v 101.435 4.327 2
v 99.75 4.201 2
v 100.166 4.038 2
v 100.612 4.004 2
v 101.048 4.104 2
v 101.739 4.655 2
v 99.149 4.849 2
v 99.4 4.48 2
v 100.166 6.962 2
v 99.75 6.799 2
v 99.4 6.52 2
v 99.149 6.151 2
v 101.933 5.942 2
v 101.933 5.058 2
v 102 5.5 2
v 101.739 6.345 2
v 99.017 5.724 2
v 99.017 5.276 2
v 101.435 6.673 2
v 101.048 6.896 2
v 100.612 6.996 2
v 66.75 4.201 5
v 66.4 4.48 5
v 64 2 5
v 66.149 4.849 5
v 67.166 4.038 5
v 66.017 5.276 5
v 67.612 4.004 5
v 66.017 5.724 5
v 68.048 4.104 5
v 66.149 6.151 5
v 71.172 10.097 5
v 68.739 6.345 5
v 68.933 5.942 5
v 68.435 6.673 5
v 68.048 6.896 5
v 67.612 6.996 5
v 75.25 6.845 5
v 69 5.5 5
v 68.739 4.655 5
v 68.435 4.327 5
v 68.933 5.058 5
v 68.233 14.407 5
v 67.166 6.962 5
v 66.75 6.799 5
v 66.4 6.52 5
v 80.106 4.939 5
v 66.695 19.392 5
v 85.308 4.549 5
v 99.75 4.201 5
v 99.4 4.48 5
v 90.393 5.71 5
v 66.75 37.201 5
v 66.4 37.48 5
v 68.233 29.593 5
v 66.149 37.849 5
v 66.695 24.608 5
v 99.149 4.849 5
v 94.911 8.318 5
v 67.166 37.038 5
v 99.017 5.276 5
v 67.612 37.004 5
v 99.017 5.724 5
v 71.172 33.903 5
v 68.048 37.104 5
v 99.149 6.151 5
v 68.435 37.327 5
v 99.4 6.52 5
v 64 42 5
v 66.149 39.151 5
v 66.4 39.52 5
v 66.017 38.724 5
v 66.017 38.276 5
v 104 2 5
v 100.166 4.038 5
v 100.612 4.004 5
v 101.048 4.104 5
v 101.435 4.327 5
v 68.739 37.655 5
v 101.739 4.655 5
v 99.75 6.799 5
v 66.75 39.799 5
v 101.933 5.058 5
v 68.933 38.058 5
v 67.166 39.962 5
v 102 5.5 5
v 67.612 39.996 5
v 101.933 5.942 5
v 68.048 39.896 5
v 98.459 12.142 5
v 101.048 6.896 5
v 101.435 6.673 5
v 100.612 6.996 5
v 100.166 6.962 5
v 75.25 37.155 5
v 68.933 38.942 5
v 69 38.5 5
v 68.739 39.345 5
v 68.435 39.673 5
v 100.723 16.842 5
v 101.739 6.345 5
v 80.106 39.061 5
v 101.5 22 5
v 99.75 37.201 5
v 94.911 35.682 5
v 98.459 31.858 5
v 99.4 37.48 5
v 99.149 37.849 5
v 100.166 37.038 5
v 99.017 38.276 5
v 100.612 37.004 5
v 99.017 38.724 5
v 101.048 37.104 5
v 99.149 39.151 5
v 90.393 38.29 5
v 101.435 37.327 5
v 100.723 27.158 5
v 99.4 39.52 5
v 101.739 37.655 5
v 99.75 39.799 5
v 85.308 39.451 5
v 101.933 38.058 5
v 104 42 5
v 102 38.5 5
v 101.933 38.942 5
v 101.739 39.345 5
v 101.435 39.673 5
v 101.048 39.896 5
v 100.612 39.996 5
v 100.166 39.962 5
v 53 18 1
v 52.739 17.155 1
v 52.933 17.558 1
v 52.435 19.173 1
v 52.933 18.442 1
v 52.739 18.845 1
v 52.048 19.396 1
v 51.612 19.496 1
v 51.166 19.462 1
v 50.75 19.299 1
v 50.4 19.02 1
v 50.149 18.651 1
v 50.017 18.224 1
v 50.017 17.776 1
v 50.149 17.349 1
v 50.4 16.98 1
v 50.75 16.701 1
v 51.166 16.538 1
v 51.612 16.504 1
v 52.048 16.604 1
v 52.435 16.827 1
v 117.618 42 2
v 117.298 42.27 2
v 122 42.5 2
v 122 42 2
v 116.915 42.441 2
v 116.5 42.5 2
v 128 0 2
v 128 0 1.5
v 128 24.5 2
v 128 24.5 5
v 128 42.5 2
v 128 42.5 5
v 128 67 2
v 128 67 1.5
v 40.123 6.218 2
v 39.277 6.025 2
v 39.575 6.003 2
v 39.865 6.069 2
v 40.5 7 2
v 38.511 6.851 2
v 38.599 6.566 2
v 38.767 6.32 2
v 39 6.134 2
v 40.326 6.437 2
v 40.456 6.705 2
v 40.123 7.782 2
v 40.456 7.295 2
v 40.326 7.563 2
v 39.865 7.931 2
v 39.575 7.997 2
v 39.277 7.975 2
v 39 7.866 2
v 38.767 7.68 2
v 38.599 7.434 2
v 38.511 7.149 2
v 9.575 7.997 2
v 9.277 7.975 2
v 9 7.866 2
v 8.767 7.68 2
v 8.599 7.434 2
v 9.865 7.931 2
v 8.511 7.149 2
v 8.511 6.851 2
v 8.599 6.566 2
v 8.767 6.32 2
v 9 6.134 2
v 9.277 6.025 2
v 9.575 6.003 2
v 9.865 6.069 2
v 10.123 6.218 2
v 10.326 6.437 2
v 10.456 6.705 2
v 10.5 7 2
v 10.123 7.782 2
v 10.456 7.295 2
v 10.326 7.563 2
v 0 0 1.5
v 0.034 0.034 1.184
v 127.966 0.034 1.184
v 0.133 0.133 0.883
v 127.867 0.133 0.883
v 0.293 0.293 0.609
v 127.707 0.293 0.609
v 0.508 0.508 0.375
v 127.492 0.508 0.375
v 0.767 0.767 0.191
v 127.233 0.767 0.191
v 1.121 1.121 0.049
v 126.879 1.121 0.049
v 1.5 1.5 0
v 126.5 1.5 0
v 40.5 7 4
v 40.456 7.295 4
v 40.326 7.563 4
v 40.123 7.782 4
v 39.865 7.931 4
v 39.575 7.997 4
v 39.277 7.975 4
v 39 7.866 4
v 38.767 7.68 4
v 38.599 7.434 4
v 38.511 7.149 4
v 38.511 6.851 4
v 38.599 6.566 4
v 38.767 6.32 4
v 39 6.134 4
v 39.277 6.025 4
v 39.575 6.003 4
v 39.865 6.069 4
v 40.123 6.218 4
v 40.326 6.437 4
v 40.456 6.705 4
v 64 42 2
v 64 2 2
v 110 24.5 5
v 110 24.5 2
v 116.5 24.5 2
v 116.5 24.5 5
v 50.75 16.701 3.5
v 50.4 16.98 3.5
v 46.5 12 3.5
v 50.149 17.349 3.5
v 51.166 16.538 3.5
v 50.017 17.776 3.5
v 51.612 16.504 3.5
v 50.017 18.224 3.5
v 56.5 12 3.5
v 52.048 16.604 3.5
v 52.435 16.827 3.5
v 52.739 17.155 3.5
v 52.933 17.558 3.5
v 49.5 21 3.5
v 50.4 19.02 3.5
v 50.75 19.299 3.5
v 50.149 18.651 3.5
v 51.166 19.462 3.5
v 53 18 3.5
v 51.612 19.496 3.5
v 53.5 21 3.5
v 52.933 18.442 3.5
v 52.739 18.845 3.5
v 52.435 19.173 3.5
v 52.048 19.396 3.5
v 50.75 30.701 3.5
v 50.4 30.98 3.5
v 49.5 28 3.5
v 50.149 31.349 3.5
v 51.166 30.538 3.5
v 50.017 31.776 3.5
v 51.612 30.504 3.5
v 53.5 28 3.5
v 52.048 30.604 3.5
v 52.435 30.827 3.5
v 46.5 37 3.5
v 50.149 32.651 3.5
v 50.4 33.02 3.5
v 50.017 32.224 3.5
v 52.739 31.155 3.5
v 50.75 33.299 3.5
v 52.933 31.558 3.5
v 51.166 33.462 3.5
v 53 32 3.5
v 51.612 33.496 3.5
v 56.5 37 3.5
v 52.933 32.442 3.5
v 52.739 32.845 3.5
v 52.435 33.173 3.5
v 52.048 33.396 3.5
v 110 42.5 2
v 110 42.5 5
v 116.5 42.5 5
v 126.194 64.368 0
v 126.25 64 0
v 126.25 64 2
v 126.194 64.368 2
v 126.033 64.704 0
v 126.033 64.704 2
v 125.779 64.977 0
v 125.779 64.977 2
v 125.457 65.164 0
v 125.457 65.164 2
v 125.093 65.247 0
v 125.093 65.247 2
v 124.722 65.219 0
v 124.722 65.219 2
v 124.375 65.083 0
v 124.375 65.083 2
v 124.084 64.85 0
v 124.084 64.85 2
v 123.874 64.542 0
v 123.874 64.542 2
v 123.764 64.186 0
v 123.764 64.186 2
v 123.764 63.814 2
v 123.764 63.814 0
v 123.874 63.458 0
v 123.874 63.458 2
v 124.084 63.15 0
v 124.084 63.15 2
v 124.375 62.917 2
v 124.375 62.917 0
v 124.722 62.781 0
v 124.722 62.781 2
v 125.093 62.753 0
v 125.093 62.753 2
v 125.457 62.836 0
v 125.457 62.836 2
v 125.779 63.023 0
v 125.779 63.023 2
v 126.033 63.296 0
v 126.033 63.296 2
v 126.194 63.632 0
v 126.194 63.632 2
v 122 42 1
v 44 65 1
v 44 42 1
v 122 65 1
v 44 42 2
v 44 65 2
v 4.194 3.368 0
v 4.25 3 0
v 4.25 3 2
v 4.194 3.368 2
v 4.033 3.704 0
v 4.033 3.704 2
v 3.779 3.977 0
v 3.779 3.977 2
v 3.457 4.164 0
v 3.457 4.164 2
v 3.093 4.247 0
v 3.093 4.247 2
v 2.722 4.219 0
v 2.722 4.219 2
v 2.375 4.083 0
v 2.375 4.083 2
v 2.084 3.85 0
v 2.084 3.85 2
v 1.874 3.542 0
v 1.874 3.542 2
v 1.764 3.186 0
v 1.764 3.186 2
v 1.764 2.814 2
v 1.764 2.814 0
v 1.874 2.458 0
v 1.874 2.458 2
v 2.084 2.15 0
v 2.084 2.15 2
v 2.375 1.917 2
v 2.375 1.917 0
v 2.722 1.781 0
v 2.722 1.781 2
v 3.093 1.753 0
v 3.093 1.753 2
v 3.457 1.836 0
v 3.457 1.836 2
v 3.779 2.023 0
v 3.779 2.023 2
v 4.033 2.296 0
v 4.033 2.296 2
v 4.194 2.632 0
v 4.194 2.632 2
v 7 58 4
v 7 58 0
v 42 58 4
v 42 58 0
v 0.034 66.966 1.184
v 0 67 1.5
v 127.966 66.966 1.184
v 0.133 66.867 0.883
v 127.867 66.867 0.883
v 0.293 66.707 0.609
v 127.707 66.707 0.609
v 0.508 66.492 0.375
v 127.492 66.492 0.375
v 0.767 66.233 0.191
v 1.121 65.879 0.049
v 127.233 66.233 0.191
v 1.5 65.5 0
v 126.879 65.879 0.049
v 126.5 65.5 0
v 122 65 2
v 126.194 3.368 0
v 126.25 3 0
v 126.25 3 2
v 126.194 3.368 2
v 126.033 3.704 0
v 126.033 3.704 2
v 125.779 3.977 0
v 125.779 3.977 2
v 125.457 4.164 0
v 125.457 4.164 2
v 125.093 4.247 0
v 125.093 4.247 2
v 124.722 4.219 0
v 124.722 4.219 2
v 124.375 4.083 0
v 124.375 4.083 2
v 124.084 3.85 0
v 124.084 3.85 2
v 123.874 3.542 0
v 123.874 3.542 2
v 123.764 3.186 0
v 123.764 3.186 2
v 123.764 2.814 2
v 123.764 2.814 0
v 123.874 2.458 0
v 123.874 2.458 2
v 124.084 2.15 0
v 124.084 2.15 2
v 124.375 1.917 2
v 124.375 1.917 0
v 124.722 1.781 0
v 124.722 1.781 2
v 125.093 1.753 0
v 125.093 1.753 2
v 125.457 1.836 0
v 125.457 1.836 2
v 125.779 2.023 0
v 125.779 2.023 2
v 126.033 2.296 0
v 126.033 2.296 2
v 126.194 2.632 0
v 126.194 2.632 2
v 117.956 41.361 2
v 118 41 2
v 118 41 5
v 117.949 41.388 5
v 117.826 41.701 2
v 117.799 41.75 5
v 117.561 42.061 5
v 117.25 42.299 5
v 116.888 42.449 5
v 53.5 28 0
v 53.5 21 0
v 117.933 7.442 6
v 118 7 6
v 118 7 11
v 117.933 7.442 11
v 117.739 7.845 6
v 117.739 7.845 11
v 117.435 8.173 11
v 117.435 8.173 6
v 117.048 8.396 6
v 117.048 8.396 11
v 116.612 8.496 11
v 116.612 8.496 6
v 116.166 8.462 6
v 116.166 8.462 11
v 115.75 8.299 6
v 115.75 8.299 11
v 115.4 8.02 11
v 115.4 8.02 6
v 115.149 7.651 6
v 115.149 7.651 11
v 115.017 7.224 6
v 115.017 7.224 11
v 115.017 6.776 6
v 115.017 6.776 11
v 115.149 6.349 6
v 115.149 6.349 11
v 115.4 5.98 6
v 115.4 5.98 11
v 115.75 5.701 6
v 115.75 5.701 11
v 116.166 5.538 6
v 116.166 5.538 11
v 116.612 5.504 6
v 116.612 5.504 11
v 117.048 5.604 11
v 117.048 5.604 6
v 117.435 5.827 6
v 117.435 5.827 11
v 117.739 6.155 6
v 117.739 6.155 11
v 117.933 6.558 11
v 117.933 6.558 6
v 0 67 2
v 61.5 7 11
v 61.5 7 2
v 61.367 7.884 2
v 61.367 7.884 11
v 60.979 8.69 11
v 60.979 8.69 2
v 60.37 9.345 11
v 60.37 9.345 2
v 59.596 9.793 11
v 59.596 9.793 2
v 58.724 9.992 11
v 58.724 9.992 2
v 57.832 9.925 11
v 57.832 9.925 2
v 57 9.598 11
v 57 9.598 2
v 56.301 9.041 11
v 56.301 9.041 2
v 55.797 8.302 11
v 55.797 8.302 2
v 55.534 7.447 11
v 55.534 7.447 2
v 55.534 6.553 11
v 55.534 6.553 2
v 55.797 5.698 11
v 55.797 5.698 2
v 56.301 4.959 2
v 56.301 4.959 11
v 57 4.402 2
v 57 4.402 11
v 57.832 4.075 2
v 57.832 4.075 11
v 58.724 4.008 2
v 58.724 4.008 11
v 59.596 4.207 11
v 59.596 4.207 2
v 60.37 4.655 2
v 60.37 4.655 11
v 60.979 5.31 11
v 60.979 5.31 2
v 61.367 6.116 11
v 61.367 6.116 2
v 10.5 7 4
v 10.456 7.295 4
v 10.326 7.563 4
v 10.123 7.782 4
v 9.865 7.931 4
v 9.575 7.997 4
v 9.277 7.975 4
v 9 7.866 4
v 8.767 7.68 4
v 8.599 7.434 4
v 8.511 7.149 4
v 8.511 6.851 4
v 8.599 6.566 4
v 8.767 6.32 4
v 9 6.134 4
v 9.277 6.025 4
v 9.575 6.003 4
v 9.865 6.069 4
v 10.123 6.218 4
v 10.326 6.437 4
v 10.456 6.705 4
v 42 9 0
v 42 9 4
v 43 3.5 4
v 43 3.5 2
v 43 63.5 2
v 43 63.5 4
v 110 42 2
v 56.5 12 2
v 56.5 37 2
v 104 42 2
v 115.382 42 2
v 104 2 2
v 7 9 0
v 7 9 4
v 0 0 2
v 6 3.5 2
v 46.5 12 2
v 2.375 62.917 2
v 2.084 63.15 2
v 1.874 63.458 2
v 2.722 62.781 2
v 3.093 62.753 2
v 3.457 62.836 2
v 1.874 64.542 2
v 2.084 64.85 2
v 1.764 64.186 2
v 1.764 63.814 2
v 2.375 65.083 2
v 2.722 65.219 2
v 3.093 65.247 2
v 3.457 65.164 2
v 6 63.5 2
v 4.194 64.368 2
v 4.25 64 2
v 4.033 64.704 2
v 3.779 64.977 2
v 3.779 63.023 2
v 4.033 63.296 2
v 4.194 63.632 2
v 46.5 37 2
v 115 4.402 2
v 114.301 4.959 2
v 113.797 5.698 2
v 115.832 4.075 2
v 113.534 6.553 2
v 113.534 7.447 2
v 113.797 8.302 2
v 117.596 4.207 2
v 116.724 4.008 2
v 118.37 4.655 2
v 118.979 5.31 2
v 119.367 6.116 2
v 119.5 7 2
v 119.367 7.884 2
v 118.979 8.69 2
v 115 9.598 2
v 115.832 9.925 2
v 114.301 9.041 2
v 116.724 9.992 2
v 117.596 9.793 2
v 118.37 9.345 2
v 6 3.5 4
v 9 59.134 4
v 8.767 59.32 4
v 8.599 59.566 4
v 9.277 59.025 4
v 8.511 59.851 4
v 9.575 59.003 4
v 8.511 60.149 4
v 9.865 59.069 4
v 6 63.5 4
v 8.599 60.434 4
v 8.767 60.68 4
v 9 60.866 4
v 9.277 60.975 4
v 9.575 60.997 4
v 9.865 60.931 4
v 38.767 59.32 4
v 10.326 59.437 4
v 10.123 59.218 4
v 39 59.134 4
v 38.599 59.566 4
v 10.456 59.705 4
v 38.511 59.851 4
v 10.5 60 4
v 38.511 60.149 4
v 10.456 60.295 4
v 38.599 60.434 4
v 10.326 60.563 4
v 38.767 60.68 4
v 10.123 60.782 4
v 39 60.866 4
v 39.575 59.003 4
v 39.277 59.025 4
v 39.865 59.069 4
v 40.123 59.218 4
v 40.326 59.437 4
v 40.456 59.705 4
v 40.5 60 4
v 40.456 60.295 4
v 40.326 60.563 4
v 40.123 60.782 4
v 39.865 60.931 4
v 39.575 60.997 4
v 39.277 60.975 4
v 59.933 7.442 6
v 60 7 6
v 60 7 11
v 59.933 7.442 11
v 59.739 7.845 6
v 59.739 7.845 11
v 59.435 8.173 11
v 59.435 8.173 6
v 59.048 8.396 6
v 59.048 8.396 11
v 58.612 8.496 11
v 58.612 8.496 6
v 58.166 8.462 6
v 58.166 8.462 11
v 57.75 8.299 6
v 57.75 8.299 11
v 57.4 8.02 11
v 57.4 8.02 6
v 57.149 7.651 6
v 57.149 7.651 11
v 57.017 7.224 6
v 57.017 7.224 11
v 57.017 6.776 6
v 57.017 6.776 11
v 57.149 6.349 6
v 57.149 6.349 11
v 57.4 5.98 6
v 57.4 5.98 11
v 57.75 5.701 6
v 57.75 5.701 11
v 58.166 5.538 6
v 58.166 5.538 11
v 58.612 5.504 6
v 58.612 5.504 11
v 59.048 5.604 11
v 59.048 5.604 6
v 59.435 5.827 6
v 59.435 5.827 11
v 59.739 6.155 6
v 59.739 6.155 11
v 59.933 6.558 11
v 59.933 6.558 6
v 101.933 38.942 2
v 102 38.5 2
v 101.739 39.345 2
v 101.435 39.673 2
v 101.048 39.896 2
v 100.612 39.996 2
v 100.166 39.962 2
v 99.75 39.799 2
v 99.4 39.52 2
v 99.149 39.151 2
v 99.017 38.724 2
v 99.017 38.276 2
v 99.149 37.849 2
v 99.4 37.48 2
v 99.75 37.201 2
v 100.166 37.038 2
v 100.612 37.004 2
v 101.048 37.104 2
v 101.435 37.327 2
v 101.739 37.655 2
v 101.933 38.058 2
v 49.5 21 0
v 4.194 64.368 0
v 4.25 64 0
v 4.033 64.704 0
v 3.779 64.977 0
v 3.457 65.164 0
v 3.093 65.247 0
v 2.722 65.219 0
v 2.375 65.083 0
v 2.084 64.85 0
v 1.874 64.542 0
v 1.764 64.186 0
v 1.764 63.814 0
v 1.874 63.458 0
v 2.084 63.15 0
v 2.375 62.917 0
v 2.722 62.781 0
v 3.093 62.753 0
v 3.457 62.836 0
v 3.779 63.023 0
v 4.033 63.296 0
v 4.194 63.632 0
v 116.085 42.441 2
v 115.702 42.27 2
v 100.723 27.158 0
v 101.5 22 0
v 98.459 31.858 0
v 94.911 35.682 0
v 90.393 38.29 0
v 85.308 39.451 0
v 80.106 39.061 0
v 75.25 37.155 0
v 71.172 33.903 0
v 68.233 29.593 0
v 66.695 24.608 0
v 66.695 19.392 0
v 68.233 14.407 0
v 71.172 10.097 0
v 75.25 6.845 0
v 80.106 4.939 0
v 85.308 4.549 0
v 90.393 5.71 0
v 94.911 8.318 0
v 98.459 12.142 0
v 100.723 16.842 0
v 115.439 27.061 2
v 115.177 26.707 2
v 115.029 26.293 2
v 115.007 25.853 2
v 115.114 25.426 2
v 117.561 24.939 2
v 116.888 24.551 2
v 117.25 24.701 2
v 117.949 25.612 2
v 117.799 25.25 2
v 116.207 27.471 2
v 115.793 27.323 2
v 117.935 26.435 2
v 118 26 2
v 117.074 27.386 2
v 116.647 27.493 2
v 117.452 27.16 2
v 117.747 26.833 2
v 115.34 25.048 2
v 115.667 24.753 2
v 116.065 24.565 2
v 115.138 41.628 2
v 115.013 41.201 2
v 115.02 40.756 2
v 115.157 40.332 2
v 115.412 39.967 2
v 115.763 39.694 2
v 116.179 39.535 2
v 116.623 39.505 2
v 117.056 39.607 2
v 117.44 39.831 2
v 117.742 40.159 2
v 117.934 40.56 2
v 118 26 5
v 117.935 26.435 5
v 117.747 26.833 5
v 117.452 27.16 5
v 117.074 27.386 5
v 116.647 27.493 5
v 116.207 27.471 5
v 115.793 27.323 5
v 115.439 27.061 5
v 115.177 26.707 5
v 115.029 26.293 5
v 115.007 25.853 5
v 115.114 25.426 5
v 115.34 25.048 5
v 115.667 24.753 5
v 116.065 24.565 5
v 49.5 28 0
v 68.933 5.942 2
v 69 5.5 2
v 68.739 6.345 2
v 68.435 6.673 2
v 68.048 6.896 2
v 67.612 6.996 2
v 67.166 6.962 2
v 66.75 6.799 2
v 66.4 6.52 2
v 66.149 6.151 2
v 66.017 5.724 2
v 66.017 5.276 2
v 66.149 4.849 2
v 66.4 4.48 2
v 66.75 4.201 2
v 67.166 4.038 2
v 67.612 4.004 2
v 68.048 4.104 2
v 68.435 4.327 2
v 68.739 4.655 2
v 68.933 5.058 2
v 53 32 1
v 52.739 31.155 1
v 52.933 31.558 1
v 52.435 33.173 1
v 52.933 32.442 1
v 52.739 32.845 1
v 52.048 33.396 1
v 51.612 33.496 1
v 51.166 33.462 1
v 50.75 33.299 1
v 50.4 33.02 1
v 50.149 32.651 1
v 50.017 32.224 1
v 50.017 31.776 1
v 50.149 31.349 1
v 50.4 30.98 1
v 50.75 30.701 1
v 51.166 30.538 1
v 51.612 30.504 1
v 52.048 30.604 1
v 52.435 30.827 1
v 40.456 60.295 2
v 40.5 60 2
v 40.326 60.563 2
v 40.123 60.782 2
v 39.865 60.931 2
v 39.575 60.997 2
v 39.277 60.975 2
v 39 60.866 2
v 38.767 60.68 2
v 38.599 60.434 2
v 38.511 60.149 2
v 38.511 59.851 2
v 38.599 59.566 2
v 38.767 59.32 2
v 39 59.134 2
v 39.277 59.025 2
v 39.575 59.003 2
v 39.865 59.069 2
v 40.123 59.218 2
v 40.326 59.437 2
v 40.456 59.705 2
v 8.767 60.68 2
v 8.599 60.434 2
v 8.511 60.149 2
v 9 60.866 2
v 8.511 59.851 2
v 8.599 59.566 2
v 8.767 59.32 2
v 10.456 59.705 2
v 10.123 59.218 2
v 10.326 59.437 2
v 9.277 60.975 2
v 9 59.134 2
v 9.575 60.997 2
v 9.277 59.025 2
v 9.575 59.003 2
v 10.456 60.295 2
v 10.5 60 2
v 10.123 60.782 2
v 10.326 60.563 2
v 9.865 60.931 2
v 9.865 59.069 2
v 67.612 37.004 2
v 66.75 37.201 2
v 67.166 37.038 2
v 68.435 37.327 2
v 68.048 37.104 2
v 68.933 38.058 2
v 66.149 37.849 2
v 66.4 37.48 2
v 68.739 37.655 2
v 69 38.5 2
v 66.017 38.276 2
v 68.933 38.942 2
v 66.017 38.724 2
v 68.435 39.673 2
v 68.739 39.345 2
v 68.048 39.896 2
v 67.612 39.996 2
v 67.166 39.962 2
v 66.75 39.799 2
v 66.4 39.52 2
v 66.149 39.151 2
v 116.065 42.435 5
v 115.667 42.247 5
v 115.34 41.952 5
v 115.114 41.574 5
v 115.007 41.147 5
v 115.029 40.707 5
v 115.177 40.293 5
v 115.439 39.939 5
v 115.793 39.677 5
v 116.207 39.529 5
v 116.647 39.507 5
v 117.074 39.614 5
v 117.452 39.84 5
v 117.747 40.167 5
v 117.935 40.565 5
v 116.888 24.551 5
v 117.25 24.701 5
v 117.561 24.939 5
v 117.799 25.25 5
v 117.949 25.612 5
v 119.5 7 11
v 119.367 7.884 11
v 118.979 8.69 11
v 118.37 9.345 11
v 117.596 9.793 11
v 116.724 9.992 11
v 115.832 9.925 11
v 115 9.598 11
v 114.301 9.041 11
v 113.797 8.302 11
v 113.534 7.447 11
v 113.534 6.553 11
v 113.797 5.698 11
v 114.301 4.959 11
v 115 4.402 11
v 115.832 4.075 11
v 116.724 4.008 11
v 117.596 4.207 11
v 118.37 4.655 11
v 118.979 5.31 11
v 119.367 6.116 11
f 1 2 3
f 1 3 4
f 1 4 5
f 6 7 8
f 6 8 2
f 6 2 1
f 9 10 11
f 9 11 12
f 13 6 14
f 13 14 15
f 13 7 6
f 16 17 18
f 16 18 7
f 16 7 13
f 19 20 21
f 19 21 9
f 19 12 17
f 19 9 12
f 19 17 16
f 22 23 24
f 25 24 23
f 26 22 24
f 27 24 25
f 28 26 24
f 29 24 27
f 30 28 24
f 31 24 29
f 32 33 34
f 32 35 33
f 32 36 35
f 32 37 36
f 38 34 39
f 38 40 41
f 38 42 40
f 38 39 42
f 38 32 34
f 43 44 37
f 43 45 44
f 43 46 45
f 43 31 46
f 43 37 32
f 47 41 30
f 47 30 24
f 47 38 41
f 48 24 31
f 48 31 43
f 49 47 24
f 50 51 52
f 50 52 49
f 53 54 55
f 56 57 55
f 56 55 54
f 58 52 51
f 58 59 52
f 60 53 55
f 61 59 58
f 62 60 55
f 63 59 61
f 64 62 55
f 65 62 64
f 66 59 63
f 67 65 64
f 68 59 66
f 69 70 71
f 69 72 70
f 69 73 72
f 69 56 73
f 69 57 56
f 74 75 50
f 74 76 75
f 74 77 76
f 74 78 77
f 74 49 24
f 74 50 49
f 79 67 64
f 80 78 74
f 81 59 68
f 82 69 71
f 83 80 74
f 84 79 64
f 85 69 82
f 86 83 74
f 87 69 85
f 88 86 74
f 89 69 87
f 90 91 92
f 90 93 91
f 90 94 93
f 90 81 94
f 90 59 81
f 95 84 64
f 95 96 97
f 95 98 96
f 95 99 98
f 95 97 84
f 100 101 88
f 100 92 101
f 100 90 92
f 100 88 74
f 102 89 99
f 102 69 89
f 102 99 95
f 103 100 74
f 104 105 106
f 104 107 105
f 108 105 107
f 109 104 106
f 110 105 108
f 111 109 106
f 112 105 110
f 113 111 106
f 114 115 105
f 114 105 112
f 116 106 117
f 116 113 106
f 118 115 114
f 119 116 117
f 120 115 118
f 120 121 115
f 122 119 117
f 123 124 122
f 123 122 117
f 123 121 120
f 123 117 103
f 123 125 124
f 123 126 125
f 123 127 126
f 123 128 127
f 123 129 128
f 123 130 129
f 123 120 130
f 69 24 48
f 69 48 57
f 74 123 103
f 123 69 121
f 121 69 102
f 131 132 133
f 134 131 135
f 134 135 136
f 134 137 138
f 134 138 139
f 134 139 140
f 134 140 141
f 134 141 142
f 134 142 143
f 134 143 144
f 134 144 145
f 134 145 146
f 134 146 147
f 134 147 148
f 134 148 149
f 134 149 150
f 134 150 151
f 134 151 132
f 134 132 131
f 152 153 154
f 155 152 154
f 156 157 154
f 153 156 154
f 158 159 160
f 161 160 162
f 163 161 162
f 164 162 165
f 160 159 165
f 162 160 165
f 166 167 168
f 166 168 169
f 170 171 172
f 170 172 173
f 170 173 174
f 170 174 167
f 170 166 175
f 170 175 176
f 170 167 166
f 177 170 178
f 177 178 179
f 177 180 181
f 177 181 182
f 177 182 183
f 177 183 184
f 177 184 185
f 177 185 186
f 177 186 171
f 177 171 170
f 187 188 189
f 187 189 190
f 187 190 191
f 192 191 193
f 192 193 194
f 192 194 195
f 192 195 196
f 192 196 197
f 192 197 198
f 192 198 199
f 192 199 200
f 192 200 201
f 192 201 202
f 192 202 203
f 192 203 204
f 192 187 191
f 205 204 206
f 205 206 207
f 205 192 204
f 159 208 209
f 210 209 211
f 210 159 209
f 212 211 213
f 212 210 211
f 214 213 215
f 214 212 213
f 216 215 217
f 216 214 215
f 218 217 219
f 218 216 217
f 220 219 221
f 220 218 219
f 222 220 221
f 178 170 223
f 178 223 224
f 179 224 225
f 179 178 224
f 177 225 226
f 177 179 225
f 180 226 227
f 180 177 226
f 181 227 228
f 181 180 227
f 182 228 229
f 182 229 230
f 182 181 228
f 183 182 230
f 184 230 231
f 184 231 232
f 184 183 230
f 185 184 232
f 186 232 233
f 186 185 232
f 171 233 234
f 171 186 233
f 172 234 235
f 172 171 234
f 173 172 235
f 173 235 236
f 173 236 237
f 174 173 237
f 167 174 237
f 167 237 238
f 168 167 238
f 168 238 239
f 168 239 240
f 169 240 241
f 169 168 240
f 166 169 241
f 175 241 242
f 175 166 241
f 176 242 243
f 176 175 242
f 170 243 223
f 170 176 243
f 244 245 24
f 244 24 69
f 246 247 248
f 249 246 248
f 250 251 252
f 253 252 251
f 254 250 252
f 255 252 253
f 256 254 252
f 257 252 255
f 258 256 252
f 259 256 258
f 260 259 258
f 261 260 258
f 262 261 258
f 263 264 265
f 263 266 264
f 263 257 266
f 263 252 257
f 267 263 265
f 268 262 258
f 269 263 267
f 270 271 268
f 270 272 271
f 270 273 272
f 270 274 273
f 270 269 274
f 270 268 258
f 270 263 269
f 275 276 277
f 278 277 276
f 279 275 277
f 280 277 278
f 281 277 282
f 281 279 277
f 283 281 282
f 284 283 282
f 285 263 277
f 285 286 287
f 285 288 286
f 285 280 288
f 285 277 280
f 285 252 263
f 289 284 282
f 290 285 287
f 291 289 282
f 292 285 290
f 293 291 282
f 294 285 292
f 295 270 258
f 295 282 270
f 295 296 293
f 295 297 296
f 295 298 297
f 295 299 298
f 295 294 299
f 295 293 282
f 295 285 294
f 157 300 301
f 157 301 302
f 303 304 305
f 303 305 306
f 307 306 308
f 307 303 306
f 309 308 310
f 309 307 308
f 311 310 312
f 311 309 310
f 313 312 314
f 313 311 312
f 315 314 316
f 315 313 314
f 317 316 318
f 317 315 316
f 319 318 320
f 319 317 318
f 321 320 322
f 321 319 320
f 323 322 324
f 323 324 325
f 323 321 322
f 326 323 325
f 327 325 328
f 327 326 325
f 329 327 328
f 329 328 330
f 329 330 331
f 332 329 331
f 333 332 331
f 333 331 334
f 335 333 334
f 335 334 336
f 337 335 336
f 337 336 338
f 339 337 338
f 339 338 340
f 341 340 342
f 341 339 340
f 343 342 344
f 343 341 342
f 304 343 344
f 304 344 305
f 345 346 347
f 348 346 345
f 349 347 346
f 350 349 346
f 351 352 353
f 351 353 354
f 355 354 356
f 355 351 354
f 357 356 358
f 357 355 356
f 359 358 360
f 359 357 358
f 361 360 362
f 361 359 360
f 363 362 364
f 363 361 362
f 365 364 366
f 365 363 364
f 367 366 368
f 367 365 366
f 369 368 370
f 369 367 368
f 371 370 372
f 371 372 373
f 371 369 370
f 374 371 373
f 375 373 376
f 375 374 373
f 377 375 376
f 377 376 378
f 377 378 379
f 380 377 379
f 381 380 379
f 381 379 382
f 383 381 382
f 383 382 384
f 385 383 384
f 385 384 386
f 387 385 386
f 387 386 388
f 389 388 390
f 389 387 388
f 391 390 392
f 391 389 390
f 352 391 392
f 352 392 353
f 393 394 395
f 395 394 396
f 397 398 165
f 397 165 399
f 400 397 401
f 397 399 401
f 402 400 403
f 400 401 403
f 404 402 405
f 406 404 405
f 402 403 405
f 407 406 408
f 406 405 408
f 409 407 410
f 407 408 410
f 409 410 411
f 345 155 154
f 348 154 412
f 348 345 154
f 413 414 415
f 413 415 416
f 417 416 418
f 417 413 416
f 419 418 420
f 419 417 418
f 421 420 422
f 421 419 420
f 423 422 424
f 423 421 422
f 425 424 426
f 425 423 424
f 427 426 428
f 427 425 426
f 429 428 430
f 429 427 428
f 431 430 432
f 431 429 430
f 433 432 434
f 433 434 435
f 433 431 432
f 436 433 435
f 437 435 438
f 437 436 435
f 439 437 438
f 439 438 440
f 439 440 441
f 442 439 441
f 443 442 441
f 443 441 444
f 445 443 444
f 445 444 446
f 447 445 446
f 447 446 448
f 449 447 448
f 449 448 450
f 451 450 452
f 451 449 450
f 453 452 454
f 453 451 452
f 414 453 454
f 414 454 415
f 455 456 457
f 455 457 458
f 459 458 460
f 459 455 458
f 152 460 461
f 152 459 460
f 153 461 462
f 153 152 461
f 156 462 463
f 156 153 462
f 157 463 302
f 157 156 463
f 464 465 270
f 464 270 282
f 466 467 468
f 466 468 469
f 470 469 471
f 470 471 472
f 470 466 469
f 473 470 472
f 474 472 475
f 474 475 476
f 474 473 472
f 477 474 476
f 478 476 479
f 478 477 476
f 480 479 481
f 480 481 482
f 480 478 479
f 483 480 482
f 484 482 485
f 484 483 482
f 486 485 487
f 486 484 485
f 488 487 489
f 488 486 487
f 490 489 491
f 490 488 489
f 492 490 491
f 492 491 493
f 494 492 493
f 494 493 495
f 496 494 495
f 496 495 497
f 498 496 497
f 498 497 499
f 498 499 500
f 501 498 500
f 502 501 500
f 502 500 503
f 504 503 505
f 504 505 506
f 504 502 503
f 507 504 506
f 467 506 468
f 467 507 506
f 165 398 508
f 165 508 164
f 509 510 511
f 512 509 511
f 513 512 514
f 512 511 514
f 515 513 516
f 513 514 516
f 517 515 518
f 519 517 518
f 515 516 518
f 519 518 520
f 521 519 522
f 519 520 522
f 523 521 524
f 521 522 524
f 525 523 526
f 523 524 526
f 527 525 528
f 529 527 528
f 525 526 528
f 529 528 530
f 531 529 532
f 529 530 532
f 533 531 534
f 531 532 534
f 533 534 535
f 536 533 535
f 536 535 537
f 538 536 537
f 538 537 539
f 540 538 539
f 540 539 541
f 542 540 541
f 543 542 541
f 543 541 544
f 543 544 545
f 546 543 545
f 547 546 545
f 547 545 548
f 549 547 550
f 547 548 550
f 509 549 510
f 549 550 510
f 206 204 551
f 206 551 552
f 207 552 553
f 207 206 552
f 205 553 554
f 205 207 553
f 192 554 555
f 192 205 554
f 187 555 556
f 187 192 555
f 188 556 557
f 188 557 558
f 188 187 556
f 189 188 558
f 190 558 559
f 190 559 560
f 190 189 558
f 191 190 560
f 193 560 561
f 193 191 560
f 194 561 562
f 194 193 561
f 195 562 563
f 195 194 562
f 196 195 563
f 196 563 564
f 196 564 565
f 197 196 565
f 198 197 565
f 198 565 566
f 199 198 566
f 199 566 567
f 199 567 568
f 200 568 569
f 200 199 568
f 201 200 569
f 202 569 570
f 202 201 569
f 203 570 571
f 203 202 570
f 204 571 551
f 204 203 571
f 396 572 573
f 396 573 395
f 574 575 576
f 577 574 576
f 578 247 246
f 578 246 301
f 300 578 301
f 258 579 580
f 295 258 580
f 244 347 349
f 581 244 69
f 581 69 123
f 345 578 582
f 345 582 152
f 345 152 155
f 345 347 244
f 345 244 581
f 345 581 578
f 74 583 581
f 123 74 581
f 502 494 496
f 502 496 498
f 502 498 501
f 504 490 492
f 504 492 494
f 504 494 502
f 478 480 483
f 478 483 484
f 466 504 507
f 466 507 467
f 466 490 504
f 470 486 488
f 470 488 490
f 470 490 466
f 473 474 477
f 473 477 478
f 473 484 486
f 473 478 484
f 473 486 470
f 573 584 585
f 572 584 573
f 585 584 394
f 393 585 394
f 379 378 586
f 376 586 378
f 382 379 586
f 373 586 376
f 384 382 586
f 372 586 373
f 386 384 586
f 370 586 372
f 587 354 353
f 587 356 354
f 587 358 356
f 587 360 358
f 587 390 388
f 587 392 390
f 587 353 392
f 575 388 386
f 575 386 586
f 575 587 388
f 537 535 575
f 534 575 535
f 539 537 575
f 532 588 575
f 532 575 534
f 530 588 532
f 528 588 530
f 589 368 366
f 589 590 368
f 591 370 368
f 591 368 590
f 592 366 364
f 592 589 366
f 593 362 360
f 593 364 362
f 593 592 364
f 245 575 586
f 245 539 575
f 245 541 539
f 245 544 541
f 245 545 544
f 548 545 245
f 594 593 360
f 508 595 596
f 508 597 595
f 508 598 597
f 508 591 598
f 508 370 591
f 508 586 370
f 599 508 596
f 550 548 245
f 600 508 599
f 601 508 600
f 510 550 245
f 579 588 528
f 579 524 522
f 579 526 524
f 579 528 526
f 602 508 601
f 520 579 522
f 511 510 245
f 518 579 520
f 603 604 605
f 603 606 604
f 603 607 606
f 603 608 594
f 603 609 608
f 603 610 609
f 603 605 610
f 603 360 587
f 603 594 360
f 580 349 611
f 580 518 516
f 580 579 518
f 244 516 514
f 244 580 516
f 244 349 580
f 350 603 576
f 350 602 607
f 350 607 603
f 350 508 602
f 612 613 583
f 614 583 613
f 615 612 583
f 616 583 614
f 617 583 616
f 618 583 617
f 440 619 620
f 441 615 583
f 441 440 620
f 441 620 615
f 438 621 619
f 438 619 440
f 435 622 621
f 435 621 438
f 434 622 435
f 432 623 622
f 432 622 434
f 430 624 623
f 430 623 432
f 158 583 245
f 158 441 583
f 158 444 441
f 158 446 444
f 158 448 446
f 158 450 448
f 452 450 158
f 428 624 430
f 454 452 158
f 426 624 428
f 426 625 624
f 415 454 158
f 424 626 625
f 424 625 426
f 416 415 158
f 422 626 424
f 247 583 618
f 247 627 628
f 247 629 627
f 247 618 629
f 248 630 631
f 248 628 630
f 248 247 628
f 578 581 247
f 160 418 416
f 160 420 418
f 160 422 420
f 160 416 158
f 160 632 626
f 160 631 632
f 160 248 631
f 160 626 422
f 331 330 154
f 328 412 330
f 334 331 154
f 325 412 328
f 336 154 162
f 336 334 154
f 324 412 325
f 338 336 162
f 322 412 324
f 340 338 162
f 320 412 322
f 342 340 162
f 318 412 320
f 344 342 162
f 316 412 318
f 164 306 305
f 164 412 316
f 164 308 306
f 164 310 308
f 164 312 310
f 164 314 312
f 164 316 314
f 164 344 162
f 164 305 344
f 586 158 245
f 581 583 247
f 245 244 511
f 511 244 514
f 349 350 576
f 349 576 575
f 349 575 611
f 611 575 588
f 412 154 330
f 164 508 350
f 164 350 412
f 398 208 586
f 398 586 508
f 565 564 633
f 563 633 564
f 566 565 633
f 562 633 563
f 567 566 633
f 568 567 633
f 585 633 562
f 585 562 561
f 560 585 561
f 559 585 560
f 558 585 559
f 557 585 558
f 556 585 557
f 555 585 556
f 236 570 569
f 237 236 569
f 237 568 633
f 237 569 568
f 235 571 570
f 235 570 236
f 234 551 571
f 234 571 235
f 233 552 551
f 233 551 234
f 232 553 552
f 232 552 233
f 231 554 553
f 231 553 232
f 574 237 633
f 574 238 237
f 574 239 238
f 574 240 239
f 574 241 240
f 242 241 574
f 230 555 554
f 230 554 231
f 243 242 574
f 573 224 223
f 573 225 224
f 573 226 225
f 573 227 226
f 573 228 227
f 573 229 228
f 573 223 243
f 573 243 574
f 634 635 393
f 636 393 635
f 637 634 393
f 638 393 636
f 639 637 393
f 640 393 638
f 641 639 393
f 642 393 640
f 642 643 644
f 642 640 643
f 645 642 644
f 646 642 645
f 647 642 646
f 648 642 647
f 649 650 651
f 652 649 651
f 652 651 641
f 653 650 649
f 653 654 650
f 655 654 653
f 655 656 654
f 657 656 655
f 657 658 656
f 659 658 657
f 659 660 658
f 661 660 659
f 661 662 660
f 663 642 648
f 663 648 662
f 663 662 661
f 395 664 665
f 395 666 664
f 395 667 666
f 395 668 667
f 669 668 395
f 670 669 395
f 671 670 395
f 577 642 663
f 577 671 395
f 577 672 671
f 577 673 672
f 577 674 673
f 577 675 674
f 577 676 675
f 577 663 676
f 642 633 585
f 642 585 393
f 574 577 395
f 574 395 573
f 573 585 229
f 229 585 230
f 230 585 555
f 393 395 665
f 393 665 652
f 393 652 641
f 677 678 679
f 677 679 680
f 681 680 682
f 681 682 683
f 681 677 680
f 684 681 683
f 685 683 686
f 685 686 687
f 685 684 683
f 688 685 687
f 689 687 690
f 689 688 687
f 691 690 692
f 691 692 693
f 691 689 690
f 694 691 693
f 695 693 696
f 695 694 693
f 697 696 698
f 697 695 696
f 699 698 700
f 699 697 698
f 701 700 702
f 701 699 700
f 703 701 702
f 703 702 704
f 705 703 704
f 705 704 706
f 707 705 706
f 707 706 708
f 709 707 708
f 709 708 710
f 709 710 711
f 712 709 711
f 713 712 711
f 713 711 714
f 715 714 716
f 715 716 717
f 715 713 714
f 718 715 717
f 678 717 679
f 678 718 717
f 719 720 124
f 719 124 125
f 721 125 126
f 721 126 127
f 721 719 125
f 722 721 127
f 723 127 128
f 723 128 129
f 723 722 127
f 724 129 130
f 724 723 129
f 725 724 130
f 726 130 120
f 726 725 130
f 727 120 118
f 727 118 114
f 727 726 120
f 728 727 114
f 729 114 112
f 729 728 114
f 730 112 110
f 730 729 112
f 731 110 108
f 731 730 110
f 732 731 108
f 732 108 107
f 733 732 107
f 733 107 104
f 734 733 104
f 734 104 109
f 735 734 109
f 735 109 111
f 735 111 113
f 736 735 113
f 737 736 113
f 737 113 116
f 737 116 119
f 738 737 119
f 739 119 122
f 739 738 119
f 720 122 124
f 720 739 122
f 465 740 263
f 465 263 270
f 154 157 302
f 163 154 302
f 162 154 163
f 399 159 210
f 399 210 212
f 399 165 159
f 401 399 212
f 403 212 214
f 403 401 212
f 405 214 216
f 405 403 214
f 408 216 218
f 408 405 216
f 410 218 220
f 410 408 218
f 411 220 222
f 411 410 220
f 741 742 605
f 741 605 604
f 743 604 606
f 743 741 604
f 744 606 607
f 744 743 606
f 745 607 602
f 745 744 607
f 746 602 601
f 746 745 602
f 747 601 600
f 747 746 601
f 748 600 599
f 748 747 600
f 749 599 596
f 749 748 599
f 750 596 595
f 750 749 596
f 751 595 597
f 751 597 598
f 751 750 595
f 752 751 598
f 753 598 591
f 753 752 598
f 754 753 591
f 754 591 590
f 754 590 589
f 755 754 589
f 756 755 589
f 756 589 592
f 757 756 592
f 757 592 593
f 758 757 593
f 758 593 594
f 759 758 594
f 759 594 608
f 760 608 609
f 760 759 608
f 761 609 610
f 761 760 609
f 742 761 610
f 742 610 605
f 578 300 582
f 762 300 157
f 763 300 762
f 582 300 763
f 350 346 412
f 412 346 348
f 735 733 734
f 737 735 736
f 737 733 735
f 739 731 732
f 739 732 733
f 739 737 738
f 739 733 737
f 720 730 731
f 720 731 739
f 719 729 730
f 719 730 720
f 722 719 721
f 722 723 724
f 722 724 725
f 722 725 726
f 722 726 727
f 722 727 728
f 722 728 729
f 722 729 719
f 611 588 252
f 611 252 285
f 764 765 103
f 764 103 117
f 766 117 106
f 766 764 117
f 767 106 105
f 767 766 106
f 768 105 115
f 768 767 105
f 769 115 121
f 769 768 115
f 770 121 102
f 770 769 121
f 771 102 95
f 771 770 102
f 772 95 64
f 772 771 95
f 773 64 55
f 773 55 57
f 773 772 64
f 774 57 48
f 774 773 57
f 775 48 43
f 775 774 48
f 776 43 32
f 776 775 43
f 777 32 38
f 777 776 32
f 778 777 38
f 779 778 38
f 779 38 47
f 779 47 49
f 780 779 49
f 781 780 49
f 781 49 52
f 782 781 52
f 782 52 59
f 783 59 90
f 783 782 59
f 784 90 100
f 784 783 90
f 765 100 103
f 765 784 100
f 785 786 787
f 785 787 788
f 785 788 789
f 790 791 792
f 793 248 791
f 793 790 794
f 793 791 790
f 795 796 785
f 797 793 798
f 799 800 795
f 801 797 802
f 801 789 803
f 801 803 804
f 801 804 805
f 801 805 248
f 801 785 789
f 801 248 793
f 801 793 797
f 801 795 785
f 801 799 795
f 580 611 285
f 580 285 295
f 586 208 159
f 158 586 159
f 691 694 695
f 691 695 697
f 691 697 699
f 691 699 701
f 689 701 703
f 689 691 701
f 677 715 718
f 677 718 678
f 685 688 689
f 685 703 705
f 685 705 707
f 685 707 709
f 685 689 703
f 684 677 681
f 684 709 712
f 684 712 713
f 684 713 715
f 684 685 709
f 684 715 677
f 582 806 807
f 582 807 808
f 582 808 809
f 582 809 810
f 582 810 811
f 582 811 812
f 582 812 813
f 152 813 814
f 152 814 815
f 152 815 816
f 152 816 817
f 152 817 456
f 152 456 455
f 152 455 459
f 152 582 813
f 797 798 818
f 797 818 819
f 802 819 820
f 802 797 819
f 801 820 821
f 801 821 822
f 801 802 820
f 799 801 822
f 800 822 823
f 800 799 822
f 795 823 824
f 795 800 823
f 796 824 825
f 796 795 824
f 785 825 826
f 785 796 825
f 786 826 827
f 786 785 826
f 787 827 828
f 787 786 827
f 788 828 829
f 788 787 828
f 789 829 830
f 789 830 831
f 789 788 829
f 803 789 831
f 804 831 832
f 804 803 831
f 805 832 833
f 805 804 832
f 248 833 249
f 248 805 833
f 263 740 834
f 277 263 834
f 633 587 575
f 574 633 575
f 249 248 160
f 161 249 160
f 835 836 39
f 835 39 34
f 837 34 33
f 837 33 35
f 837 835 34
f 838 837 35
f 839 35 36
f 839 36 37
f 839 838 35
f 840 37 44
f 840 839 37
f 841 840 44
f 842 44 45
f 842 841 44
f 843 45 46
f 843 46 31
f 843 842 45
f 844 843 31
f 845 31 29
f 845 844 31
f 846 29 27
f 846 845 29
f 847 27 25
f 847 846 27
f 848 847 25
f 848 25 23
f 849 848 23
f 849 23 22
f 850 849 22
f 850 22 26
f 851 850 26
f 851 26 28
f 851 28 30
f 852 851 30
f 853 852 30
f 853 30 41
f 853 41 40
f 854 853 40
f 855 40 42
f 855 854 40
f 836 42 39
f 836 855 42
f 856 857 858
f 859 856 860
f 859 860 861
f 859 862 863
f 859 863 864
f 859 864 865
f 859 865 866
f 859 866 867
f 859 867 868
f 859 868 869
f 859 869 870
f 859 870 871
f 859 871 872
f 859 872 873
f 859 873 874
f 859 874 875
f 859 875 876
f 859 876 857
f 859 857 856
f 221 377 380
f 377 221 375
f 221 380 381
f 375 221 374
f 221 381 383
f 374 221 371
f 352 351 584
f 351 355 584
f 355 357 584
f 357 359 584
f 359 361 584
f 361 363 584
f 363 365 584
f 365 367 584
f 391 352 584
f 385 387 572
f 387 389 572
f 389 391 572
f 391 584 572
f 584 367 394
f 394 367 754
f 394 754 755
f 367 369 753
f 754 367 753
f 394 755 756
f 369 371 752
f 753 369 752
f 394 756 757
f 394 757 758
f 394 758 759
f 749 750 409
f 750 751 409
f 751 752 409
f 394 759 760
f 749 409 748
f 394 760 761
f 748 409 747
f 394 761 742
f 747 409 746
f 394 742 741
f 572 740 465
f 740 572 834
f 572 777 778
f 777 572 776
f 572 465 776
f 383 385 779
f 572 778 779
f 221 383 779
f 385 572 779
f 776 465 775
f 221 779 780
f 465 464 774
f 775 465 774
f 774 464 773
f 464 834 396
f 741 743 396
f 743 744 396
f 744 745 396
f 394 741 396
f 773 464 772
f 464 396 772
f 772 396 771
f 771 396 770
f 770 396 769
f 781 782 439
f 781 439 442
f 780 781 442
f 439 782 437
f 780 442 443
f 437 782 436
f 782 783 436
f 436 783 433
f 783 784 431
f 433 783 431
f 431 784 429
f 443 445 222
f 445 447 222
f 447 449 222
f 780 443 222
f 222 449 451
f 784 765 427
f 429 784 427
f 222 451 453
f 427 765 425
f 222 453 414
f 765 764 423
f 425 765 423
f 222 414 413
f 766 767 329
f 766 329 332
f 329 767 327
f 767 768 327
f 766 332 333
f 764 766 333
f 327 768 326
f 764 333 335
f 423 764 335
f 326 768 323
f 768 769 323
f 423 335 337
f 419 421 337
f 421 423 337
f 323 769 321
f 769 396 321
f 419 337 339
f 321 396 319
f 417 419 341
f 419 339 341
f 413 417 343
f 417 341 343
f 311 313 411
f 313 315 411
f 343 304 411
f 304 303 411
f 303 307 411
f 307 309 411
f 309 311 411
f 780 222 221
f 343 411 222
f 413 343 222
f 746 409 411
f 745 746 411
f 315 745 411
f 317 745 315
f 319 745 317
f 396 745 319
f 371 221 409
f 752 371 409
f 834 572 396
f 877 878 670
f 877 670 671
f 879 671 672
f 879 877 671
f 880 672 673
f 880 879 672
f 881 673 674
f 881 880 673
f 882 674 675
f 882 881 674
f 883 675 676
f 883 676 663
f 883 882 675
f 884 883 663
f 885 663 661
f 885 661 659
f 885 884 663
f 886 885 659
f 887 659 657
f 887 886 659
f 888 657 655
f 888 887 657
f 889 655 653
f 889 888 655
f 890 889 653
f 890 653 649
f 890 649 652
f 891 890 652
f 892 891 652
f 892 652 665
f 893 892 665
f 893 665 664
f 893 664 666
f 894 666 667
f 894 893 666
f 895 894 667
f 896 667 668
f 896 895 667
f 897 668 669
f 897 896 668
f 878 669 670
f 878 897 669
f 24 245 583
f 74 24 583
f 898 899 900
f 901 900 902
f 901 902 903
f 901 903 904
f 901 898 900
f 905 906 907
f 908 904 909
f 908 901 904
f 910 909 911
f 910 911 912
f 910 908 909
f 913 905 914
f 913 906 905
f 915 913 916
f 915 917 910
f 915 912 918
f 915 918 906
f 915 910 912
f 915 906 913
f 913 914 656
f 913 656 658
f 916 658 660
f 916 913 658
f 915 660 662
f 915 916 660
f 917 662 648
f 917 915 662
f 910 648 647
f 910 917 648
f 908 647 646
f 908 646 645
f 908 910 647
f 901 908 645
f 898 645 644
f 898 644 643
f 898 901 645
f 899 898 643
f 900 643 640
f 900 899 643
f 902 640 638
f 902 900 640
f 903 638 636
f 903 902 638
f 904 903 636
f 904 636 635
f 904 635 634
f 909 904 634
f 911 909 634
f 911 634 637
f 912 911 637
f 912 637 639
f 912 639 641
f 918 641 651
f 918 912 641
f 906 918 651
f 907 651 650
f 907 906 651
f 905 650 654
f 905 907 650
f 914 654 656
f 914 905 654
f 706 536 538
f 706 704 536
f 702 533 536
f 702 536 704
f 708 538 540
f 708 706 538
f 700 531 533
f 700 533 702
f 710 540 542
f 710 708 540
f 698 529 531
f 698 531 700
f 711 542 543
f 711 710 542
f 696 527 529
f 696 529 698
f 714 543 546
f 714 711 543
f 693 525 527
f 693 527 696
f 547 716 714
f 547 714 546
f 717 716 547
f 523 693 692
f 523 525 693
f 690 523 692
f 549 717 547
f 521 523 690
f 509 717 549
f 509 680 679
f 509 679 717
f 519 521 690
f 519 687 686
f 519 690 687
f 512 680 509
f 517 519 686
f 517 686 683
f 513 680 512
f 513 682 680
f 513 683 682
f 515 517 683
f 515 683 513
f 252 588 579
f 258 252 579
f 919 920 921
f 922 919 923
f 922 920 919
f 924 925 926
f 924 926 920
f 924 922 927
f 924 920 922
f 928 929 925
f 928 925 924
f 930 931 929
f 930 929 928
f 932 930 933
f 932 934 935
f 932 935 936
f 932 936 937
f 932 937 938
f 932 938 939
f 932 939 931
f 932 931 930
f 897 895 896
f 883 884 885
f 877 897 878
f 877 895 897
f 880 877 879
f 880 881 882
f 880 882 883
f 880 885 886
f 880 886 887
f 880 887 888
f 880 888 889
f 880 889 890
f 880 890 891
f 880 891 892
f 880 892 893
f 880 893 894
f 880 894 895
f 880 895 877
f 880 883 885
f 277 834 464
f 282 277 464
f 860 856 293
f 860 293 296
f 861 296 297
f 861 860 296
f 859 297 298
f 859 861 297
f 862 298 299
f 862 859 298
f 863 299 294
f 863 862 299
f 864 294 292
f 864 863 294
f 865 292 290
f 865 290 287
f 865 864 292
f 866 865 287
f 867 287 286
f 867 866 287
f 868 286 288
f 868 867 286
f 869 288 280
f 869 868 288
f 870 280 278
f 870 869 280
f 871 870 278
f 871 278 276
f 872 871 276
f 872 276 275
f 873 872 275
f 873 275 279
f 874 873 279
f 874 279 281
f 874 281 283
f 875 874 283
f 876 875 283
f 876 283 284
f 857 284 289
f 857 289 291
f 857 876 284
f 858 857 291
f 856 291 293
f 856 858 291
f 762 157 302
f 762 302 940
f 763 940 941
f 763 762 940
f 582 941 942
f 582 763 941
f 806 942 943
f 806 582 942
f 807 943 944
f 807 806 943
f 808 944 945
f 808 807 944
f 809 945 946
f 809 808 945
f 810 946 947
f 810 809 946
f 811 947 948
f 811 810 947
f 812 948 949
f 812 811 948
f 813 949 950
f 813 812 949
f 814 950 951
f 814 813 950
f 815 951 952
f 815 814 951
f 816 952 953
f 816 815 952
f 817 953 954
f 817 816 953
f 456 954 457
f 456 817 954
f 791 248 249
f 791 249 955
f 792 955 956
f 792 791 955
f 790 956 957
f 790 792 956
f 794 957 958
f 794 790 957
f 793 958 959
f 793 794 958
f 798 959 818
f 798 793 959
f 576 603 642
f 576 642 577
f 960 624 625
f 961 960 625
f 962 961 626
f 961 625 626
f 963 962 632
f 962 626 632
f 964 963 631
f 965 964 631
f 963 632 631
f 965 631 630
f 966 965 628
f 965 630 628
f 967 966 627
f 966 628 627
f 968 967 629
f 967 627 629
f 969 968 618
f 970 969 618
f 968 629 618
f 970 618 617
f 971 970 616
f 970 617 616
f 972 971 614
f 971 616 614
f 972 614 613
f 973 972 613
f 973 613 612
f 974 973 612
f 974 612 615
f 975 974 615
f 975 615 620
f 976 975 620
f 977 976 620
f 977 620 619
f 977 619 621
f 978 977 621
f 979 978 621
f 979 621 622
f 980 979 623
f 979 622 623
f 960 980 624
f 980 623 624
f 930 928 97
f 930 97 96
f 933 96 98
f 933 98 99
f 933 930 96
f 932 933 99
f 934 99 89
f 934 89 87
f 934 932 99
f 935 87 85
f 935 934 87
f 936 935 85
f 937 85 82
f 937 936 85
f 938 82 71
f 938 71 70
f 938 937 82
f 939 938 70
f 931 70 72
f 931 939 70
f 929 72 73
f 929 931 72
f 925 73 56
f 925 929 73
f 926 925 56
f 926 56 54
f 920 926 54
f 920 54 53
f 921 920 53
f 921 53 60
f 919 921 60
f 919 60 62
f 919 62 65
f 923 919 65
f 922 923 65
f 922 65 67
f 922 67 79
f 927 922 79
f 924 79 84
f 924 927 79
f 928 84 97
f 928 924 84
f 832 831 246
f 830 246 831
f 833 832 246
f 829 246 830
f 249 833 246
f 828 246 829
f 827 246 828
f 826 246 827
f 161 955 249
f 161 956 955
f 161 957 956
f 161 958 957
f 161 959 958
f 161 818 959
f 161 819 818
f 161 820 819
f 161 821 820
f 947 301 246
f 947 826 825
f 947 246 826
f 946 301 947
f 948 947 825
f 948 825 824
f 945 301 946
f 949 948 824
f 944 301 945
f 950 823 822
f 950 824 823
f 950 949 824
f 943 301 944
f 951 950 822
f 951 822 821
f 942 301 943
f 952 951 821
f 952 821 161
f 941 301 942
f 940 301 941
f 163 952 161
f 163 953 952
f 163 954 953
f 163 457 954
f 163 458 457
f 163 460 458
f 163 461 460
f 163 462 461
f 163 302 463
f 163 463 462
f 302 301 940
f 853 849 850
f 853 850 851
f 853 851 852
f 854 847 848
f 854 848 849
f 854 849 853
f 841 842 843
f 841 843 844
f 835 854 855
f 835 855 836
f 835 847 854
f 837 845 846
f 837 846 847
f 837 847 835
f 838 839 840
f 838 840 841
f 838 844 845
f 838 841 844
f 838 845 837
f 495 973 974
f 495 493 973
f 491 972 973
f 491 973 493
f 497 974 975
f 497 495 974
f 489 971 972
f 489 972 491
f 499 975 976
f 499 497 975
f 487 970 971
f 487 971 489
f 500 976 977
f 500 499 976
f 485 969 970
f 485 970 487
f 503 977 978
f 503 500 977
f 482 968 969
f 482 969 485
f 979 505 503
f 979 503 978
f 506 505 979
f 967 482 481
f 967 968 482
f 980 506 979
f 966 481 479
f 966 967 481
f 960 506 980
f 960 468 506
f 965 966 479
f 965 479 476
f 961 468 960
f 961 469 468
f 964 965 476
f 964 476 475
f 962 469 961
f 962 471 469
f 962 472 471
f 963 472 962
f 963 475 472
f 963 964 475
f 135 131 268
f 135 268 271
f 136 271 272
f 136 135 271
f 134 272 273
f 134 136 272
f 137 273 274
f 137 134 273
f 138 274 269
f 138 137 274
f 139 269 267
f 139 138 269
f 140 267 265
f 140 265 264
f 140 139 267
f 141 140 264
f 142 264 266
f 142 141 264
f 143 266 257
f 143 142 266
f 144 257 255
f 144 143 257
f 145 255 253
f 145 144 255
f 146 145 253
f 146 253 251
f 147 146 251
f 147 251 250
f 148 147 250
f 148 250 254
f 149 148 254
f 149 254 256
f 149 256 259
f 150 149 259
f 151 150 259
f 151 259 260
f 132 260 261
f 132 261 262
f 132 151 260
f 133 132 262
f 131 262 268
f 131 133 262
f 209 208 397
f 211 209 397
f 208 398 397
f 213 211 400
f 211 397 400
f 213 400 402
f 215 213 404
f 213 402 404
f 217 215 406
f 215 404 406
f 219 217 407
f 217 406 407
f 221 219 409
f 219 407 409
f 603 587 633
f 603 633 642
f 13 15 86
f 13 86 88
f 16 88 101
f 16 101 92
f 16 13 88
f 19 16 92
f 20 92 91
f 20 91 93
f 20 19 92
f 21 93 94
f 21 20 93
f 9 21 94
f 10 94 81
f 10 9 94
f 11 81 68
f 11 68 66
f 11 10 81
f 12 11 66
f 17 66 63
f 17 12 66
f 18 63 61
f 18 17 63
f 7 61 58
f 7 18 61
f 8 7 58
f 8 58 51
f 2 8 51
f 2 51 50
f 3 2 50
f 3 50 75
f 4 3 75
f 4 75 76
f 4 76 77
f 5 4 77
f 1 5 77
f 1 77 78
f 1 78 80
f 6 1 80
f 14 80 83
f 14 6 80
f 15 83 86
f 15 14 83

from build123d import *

# Parameters (mm, degrees)
BOX_W             = 128
BOX_H             = 67
BOX_DEPTH         = 2
BOX001_W          = 37
BOX001_H          = 60
BOX001_DEPTH      = 2
BOX002_W          = 35
BOX002_H          = 49
BOX002_DEPTH      = 4
BOX003_W          = 78
BOX003_H          = 23
BOX003_DEPTH      = 1
BOX004_W          = 40
BOX004_H          = 40
BOX004_DEPTH      = 3
CYLINDER_R        = 17.5
CYLINDER_DEPTH    = 5
CYLINDER001_R     = 1.5
CYLINDER001_DEPTH = 3
CYLINDER002_R     = 1.5
CYLINDER002_DEPTH = 3
CYLINDER003_R     = 1.5
CYLINDER003_DEPTH = 3
CYLINDER004_R     = 1.5
CYLINDER004_DEPTH = 3
BOX005_W          = 18
BOX005_H          = 18
BOX005_DEPTH      = 3
CYLINDER005_R     = 1.5
CYLINDER005_DEPTH = 3
CYLINDER006_R     = 1.5
CYLINDER006_DEPTH = 3
CYLINDER007_R     = 3
CYLINDER007_DEPTH = 9
CYLINDER008_R     = 1.5
CYLINDER008_DEPTH = 5
CYLINDER009_R     = 3
CYLINDER009_DEPTH = 9
CYLINDER010_R     = 1.5
CYLINDER010_DEPTH = 5
BOX006_W          = 10
BOX006_H          = 25
BOX006_DEPTH      = 1.5
BOX007_W          = 4
BOX007_H          = 7
BOX007_DEPTH      = 6
CYLINDER011_R     = 1.5
CYLINDER011_DEPTH = 2.5
CYLINDER012_R     = 1.5
CYLINDER012_DEPTH = 2.5
CYLINDER013_R     = 1
CYLINDER013_DEPTH = 2
CYLINDER014_R     = 1
CYLINDER014_DEPTH = 2
CYLINDER015_R     = 1
CYLINDER015_DEPTH = 2
CYLINDER016_R     = 1
CYLINDER016_DEPTH = 2
CYLINDER017_R     = 1.25
CYLINDER017_DEPTH = 2
CYLINDER018_R     = 1.25
CYLINDER018_DEPTH = 2
CYLINDER019_R     = 1.25
CYLINDER019_DEPTH = 2
CYLINDER020_R     = 1.25
CYLINDER020_DEPTH = 2
FILLET_R          = 1.5


with BuildPart() as part:
    # Box → Box (join)
    with BuildSketch(Plane.XY):
        with Locations((64, 33.5)):
            Rectangle(BOX_W, BOX_H)
    extrude(amount=BOX_DEPTH)

    # Box001 → Box001 (join)
    with BuildSketch(Plane(origin=(6, 3.5, 2), x_dir=(1, 0, 0), z_dir=(0, 0, 1))):
        with Locations((18.5, 30)):
            Rectangle(BOX001_W, BOX001_H)
    extrude(amount=BOX001_DEPTH)

    # Box002 → Box002 (cut)
    with BuildSketch(Plane(origin=(7, 9, 0), x_dir=(1, 0, 0), z_dir=(0, 0, 1))):
        with Locations((17.5, 24.5)):
            Rectangle(BOX002_W, BOX002_H)
    extrude(amount=BOX002_DEPTH, mode=Mode.SUBTRACT)

    # Box003 → Box003 (cut)
    with BuildSketch(Plane(origin=(44, 42, 1), x_dir=(1, 0, 0), z_dir=(0, 0, 1))):
        with Locations((39, 11.5)):
            Rectangle(BOX003_W, BOX003_H)
    extrude(amount=BOX003_DEPTH, mode=Mode.SUBTRACT)

    # Box004 → Box004 (join)
    with BuildSketch(Plane(origin=(64, 2, 2), x_dir=(1, 0, 0), z_dir=(0, 0, 1))):
        with Locations((20, 20)):
            Rectangle(BOX004_W, BOX004_H)
    extrude(amount=BOX004_DEPTH)

    # Cylinder → Cylinder (cut)
    with BuildSketch(Plane(origin=(84, 22, 0), x_dir=(1, 0, 0), z_dir=(0, 0, 1))):
        Circle(CYLINDER_R)
    extrude(amount=CYLINDER_DEPTH, mode=Mode.SUBTRACT)

    # Cylinder001 → Cylinder001 (cut)
    with BuildSketch(Plane(origin=(67.5, 5.5, 2), x_dir=(1, 0, 0), z_dir=(0, 0, 1))):
        Circle(CYLINDER001_R)
    extrude(amount=CYLINDER001_DEPTH, mode=Mode.SUBTRACT)

    # Cylinder002 → Cylinder002 (cut)
    with BuildSketch(Plane(origin=(67.5, 38.5, 2), x_dir=(1, 0, 0), z_dir=(0, 0, 1))):
        Circle(CYLINDER002_R)
    extrude(amount=CYLINDER002_DEPTH, mode=Mode.SUBTRACT)

    # Cylinder003 → Cylinder003 (cut)
    with BuildSketch(Plane(origin=(100.5, 38.5, 2), x_dir=(1, 0, 0), z_dir=(0, 0, 1))):
        Circle(CYLINDER003_R)
    extrude(amount=CYLINDER003_DEPTH, mode=Mode.SUBTRACT)

    # Cylinder004 → Cylinder004 (cut)
    with BuildSketch(Plane(origin=(100.5, 5.5, 2), x_dir=(1, 0, 0), z_dir=(0, 0, 1))):
        Circle(CYLINDER004_R)
    extrude(amount=CYLINDER004_DEPTH, mode=Mode.SUBTRACT)

    # Box005 → Box005 (join)
    with BuildSketch(Plane(origin=(110, 24.5, 2), x_dir=(1, 0, 0), z_dir=(0, 0, 1))):
        with Locations((9, 9)):
            Rectangle(BOX005_W, BOX005_H)
    extrude(amount=BOX005_DEPTH)

    # Cylinder005 → Cylinder005 (cut)
    with BuildSketch(Plane(origin=(116.5, 26, 2), x_dir=(1, 0, 0), z_dir=(0, 0, 1))):
        Circle(CYLINDER005_R)
    extrude(amount=CYLINDER005_DEPTH, mode=Mode.SUBTRACT)

    # Cylinder006 → Cylinder006 (cut)
    with BuildSketch(Plane(origin=(116.5, 41, 2), x_dir=(1, 0, 0), z_dir=(0, 0, 1))):
        Circle(CYLINDER006_R)
    extrude(amount=CYLINDER006_DEPTH, mode=Mode.SUBTRACT)

    # Cylinder007 → Cylinder007 (join)
    with BuildSketch(Plane(origin=(116.5, 7, 2), x_dir=(1, 0, 0), z_dir=(0, 0, 1))):
        Circle(CYLINDER007_R)
    extrude(amount=CYLINDER007_DEPTH)

    # Cylinder008 → Cylinder008 (cut)
    with BuildSketch(Plane(origin=(116.5, 7, 6), x_dir=(1, 0, 0), z_dir=(0, 0, 1))):
        Circle(CYLINDER008_R)
    extrude(amount=CYLINDER008_DEPTH, mode=Mode.SUBTRACT)

    # Cylinder009 → Cylinder009 (join)
    with BuildSketch(Plane(origin=(58.5, 7, 2), x_dir=(1, 0, 0), z_dir=(0, 0, 1))):
        Circle(CYLINDER009_R)
    extrude(amount=CYLINDER009_DEPTH)

    # Cylinder010 → Cylinder010 (cut)
    with BuildSketch(Plane(origin=(58.5, 7, 6), x_dir=(1, 0, 0), z_dir=(0, 0, 1))):
        Circle(CYLINDER010_R)
    extrude(amount=CYLINDER010_DEPTH, mode=Mode.SUBTRACT)

    # Box006 → Box006 (join)
    with BuildSketch(Plane(origin=(46.5, 12, 2), x_dir=(1, 0, 0), z_dir=(0, 0, 1))):
        with Locations((5, 12.5)):
            Rectangle(BOX006_W, BOX006_H)
    extrude(amount=BOX006_DEPTH)

    # Box007 → Box007 (cut)
    with BuildSketch(Plane(origin=(49.5, 21, -1.5), x_dir=(1, 0, 0), z_dir=(0, 0, 1))):
        with Locations((2, 3.5)):
            Rectangle(BOX007_W, BOX007_H)
    extrude(amount=BOX007_DEPTH, mode=Mode.SUBTRACT)

    # Cylinder011 → Cylinder011 (cut)
    with BuildSketch(Plane(origin=(51.5, 18, 1), x_dir=(1, 0, 0), z_dir=(0, 0, 1))):
        Circle(CYLINDER011_R)
    extrude(amount=CYLINDER011_DEPTH, mode=Mode.SUBTRACT)

    # Cylinder012 → Cylinder012 (cut)
    with BuildSketch(Plane(origin=(51.5, 32, 1), x_dir=(1, 0, 0), z_dir=(0, 0, 1))):
        Circle(CYLINDER012_R)
    extrude(amount=CYLINDER012_DEPTH, mode=Mode.SUBTRACT)

    # Cylinder013 → Cylinder013 (cut)
    with BuildSketch(Plane(origin=(9.5, 7, 2), x_dir=(1, 0, 0), z_dir=(0, 0, 1))):
        Circle(CYLINDER013_R)
    extrude(amount=CYLINDER013_DEPTH, mode=Mode.SUBTRACT)

    # Cylinder014 → Cylinder014 (cut)
    with BuildSketch(Plane(origin=(9.5, 60, 2), x_dir=(1, 0, 0), z_dir=(0, 0, 1))):
        Circle(CYLINDER014_R)
    extrude(amount=CYLINDER014_DEPTH, mode=Mode.SUBTRACT)

    # Cylinder015 → Cylinder015 (cut)
    with BuildSketch(Plane(origin=(39.5, 60, 2), x_dir=(1, 0, 0), z_dir=(0, 0, 1))):
        Circle(CYLINDER015_R)
    extrude(amount=CYLINDER015_DEPTH, mode=Mode.SUBTRACT)

    # Cylinder016 → Cylinder016 (cut)
    with BuildSketch(Plane(origin=(39.5, 7, 2), x_dir=(1, 0, 0), z_dir=(0, 0, 1))):
        Circle(CYLINDER016_R)
    extrude(amount=CYLINDER016_DEPTH, mode=Mode.SUBTRACT)

    # Cylinder017 → Cylinder017 (cut)
    with BuildSketch(Plane(origin=(3, 3, 0), x_dir=(1, 0, 0), z_dir=(0, 0, 1))):
        Circle(CYLINDER017_R)
    extrude(amount=CYLINDER017_DEPTH, mode=Mode.SUBTRACT)

    # Cylinder018 → Cylinder018 (cut)
    with BuildSketch(Plane(origin=(3, 64, 0), x_dir=(1, 0, 0), z_dir=(0, 0, 1))):
        Circle(CYLINDER018_R)
    extrude(amount=CYLINDER018_DEPTH, mode=Mode.SUBTRACT)

    # Cylinder019 → Cylinder019 (cut)
    with BuildSketch(Plane(origin=(125, 64, 0), x_dir=(1, 0, 0), z_dir=(0, 0, 1))):
        Circle(CYLINDER019_R)
    extrude(amount=CYLINDER019_DEPTH, mode=Mode.SUBTRACT)

    # Cylinder020 → Cylinder020 (cut)
    with BuildSketch(Plane(origin=(125, 3, 0), x_dir=(1, 0, 0), z_dir=(0, 0, 1))):
        Circle(CYLINDER020_R)
    extrude(amount=CYLINDER020_DEPTH, mode=Mode.SUBTRACT)

    # Fillet
    fillet_edges = [part.edges().sort_by_distance(p)[0] for p in [
        (64, 0, 0),
        (0, 33.5, 0),
        (64, 67, 0),
        (128, 33.5, 0),
    ]]
    fillet(fillet_edges, radius=FILLET_R)


solid = part.part
